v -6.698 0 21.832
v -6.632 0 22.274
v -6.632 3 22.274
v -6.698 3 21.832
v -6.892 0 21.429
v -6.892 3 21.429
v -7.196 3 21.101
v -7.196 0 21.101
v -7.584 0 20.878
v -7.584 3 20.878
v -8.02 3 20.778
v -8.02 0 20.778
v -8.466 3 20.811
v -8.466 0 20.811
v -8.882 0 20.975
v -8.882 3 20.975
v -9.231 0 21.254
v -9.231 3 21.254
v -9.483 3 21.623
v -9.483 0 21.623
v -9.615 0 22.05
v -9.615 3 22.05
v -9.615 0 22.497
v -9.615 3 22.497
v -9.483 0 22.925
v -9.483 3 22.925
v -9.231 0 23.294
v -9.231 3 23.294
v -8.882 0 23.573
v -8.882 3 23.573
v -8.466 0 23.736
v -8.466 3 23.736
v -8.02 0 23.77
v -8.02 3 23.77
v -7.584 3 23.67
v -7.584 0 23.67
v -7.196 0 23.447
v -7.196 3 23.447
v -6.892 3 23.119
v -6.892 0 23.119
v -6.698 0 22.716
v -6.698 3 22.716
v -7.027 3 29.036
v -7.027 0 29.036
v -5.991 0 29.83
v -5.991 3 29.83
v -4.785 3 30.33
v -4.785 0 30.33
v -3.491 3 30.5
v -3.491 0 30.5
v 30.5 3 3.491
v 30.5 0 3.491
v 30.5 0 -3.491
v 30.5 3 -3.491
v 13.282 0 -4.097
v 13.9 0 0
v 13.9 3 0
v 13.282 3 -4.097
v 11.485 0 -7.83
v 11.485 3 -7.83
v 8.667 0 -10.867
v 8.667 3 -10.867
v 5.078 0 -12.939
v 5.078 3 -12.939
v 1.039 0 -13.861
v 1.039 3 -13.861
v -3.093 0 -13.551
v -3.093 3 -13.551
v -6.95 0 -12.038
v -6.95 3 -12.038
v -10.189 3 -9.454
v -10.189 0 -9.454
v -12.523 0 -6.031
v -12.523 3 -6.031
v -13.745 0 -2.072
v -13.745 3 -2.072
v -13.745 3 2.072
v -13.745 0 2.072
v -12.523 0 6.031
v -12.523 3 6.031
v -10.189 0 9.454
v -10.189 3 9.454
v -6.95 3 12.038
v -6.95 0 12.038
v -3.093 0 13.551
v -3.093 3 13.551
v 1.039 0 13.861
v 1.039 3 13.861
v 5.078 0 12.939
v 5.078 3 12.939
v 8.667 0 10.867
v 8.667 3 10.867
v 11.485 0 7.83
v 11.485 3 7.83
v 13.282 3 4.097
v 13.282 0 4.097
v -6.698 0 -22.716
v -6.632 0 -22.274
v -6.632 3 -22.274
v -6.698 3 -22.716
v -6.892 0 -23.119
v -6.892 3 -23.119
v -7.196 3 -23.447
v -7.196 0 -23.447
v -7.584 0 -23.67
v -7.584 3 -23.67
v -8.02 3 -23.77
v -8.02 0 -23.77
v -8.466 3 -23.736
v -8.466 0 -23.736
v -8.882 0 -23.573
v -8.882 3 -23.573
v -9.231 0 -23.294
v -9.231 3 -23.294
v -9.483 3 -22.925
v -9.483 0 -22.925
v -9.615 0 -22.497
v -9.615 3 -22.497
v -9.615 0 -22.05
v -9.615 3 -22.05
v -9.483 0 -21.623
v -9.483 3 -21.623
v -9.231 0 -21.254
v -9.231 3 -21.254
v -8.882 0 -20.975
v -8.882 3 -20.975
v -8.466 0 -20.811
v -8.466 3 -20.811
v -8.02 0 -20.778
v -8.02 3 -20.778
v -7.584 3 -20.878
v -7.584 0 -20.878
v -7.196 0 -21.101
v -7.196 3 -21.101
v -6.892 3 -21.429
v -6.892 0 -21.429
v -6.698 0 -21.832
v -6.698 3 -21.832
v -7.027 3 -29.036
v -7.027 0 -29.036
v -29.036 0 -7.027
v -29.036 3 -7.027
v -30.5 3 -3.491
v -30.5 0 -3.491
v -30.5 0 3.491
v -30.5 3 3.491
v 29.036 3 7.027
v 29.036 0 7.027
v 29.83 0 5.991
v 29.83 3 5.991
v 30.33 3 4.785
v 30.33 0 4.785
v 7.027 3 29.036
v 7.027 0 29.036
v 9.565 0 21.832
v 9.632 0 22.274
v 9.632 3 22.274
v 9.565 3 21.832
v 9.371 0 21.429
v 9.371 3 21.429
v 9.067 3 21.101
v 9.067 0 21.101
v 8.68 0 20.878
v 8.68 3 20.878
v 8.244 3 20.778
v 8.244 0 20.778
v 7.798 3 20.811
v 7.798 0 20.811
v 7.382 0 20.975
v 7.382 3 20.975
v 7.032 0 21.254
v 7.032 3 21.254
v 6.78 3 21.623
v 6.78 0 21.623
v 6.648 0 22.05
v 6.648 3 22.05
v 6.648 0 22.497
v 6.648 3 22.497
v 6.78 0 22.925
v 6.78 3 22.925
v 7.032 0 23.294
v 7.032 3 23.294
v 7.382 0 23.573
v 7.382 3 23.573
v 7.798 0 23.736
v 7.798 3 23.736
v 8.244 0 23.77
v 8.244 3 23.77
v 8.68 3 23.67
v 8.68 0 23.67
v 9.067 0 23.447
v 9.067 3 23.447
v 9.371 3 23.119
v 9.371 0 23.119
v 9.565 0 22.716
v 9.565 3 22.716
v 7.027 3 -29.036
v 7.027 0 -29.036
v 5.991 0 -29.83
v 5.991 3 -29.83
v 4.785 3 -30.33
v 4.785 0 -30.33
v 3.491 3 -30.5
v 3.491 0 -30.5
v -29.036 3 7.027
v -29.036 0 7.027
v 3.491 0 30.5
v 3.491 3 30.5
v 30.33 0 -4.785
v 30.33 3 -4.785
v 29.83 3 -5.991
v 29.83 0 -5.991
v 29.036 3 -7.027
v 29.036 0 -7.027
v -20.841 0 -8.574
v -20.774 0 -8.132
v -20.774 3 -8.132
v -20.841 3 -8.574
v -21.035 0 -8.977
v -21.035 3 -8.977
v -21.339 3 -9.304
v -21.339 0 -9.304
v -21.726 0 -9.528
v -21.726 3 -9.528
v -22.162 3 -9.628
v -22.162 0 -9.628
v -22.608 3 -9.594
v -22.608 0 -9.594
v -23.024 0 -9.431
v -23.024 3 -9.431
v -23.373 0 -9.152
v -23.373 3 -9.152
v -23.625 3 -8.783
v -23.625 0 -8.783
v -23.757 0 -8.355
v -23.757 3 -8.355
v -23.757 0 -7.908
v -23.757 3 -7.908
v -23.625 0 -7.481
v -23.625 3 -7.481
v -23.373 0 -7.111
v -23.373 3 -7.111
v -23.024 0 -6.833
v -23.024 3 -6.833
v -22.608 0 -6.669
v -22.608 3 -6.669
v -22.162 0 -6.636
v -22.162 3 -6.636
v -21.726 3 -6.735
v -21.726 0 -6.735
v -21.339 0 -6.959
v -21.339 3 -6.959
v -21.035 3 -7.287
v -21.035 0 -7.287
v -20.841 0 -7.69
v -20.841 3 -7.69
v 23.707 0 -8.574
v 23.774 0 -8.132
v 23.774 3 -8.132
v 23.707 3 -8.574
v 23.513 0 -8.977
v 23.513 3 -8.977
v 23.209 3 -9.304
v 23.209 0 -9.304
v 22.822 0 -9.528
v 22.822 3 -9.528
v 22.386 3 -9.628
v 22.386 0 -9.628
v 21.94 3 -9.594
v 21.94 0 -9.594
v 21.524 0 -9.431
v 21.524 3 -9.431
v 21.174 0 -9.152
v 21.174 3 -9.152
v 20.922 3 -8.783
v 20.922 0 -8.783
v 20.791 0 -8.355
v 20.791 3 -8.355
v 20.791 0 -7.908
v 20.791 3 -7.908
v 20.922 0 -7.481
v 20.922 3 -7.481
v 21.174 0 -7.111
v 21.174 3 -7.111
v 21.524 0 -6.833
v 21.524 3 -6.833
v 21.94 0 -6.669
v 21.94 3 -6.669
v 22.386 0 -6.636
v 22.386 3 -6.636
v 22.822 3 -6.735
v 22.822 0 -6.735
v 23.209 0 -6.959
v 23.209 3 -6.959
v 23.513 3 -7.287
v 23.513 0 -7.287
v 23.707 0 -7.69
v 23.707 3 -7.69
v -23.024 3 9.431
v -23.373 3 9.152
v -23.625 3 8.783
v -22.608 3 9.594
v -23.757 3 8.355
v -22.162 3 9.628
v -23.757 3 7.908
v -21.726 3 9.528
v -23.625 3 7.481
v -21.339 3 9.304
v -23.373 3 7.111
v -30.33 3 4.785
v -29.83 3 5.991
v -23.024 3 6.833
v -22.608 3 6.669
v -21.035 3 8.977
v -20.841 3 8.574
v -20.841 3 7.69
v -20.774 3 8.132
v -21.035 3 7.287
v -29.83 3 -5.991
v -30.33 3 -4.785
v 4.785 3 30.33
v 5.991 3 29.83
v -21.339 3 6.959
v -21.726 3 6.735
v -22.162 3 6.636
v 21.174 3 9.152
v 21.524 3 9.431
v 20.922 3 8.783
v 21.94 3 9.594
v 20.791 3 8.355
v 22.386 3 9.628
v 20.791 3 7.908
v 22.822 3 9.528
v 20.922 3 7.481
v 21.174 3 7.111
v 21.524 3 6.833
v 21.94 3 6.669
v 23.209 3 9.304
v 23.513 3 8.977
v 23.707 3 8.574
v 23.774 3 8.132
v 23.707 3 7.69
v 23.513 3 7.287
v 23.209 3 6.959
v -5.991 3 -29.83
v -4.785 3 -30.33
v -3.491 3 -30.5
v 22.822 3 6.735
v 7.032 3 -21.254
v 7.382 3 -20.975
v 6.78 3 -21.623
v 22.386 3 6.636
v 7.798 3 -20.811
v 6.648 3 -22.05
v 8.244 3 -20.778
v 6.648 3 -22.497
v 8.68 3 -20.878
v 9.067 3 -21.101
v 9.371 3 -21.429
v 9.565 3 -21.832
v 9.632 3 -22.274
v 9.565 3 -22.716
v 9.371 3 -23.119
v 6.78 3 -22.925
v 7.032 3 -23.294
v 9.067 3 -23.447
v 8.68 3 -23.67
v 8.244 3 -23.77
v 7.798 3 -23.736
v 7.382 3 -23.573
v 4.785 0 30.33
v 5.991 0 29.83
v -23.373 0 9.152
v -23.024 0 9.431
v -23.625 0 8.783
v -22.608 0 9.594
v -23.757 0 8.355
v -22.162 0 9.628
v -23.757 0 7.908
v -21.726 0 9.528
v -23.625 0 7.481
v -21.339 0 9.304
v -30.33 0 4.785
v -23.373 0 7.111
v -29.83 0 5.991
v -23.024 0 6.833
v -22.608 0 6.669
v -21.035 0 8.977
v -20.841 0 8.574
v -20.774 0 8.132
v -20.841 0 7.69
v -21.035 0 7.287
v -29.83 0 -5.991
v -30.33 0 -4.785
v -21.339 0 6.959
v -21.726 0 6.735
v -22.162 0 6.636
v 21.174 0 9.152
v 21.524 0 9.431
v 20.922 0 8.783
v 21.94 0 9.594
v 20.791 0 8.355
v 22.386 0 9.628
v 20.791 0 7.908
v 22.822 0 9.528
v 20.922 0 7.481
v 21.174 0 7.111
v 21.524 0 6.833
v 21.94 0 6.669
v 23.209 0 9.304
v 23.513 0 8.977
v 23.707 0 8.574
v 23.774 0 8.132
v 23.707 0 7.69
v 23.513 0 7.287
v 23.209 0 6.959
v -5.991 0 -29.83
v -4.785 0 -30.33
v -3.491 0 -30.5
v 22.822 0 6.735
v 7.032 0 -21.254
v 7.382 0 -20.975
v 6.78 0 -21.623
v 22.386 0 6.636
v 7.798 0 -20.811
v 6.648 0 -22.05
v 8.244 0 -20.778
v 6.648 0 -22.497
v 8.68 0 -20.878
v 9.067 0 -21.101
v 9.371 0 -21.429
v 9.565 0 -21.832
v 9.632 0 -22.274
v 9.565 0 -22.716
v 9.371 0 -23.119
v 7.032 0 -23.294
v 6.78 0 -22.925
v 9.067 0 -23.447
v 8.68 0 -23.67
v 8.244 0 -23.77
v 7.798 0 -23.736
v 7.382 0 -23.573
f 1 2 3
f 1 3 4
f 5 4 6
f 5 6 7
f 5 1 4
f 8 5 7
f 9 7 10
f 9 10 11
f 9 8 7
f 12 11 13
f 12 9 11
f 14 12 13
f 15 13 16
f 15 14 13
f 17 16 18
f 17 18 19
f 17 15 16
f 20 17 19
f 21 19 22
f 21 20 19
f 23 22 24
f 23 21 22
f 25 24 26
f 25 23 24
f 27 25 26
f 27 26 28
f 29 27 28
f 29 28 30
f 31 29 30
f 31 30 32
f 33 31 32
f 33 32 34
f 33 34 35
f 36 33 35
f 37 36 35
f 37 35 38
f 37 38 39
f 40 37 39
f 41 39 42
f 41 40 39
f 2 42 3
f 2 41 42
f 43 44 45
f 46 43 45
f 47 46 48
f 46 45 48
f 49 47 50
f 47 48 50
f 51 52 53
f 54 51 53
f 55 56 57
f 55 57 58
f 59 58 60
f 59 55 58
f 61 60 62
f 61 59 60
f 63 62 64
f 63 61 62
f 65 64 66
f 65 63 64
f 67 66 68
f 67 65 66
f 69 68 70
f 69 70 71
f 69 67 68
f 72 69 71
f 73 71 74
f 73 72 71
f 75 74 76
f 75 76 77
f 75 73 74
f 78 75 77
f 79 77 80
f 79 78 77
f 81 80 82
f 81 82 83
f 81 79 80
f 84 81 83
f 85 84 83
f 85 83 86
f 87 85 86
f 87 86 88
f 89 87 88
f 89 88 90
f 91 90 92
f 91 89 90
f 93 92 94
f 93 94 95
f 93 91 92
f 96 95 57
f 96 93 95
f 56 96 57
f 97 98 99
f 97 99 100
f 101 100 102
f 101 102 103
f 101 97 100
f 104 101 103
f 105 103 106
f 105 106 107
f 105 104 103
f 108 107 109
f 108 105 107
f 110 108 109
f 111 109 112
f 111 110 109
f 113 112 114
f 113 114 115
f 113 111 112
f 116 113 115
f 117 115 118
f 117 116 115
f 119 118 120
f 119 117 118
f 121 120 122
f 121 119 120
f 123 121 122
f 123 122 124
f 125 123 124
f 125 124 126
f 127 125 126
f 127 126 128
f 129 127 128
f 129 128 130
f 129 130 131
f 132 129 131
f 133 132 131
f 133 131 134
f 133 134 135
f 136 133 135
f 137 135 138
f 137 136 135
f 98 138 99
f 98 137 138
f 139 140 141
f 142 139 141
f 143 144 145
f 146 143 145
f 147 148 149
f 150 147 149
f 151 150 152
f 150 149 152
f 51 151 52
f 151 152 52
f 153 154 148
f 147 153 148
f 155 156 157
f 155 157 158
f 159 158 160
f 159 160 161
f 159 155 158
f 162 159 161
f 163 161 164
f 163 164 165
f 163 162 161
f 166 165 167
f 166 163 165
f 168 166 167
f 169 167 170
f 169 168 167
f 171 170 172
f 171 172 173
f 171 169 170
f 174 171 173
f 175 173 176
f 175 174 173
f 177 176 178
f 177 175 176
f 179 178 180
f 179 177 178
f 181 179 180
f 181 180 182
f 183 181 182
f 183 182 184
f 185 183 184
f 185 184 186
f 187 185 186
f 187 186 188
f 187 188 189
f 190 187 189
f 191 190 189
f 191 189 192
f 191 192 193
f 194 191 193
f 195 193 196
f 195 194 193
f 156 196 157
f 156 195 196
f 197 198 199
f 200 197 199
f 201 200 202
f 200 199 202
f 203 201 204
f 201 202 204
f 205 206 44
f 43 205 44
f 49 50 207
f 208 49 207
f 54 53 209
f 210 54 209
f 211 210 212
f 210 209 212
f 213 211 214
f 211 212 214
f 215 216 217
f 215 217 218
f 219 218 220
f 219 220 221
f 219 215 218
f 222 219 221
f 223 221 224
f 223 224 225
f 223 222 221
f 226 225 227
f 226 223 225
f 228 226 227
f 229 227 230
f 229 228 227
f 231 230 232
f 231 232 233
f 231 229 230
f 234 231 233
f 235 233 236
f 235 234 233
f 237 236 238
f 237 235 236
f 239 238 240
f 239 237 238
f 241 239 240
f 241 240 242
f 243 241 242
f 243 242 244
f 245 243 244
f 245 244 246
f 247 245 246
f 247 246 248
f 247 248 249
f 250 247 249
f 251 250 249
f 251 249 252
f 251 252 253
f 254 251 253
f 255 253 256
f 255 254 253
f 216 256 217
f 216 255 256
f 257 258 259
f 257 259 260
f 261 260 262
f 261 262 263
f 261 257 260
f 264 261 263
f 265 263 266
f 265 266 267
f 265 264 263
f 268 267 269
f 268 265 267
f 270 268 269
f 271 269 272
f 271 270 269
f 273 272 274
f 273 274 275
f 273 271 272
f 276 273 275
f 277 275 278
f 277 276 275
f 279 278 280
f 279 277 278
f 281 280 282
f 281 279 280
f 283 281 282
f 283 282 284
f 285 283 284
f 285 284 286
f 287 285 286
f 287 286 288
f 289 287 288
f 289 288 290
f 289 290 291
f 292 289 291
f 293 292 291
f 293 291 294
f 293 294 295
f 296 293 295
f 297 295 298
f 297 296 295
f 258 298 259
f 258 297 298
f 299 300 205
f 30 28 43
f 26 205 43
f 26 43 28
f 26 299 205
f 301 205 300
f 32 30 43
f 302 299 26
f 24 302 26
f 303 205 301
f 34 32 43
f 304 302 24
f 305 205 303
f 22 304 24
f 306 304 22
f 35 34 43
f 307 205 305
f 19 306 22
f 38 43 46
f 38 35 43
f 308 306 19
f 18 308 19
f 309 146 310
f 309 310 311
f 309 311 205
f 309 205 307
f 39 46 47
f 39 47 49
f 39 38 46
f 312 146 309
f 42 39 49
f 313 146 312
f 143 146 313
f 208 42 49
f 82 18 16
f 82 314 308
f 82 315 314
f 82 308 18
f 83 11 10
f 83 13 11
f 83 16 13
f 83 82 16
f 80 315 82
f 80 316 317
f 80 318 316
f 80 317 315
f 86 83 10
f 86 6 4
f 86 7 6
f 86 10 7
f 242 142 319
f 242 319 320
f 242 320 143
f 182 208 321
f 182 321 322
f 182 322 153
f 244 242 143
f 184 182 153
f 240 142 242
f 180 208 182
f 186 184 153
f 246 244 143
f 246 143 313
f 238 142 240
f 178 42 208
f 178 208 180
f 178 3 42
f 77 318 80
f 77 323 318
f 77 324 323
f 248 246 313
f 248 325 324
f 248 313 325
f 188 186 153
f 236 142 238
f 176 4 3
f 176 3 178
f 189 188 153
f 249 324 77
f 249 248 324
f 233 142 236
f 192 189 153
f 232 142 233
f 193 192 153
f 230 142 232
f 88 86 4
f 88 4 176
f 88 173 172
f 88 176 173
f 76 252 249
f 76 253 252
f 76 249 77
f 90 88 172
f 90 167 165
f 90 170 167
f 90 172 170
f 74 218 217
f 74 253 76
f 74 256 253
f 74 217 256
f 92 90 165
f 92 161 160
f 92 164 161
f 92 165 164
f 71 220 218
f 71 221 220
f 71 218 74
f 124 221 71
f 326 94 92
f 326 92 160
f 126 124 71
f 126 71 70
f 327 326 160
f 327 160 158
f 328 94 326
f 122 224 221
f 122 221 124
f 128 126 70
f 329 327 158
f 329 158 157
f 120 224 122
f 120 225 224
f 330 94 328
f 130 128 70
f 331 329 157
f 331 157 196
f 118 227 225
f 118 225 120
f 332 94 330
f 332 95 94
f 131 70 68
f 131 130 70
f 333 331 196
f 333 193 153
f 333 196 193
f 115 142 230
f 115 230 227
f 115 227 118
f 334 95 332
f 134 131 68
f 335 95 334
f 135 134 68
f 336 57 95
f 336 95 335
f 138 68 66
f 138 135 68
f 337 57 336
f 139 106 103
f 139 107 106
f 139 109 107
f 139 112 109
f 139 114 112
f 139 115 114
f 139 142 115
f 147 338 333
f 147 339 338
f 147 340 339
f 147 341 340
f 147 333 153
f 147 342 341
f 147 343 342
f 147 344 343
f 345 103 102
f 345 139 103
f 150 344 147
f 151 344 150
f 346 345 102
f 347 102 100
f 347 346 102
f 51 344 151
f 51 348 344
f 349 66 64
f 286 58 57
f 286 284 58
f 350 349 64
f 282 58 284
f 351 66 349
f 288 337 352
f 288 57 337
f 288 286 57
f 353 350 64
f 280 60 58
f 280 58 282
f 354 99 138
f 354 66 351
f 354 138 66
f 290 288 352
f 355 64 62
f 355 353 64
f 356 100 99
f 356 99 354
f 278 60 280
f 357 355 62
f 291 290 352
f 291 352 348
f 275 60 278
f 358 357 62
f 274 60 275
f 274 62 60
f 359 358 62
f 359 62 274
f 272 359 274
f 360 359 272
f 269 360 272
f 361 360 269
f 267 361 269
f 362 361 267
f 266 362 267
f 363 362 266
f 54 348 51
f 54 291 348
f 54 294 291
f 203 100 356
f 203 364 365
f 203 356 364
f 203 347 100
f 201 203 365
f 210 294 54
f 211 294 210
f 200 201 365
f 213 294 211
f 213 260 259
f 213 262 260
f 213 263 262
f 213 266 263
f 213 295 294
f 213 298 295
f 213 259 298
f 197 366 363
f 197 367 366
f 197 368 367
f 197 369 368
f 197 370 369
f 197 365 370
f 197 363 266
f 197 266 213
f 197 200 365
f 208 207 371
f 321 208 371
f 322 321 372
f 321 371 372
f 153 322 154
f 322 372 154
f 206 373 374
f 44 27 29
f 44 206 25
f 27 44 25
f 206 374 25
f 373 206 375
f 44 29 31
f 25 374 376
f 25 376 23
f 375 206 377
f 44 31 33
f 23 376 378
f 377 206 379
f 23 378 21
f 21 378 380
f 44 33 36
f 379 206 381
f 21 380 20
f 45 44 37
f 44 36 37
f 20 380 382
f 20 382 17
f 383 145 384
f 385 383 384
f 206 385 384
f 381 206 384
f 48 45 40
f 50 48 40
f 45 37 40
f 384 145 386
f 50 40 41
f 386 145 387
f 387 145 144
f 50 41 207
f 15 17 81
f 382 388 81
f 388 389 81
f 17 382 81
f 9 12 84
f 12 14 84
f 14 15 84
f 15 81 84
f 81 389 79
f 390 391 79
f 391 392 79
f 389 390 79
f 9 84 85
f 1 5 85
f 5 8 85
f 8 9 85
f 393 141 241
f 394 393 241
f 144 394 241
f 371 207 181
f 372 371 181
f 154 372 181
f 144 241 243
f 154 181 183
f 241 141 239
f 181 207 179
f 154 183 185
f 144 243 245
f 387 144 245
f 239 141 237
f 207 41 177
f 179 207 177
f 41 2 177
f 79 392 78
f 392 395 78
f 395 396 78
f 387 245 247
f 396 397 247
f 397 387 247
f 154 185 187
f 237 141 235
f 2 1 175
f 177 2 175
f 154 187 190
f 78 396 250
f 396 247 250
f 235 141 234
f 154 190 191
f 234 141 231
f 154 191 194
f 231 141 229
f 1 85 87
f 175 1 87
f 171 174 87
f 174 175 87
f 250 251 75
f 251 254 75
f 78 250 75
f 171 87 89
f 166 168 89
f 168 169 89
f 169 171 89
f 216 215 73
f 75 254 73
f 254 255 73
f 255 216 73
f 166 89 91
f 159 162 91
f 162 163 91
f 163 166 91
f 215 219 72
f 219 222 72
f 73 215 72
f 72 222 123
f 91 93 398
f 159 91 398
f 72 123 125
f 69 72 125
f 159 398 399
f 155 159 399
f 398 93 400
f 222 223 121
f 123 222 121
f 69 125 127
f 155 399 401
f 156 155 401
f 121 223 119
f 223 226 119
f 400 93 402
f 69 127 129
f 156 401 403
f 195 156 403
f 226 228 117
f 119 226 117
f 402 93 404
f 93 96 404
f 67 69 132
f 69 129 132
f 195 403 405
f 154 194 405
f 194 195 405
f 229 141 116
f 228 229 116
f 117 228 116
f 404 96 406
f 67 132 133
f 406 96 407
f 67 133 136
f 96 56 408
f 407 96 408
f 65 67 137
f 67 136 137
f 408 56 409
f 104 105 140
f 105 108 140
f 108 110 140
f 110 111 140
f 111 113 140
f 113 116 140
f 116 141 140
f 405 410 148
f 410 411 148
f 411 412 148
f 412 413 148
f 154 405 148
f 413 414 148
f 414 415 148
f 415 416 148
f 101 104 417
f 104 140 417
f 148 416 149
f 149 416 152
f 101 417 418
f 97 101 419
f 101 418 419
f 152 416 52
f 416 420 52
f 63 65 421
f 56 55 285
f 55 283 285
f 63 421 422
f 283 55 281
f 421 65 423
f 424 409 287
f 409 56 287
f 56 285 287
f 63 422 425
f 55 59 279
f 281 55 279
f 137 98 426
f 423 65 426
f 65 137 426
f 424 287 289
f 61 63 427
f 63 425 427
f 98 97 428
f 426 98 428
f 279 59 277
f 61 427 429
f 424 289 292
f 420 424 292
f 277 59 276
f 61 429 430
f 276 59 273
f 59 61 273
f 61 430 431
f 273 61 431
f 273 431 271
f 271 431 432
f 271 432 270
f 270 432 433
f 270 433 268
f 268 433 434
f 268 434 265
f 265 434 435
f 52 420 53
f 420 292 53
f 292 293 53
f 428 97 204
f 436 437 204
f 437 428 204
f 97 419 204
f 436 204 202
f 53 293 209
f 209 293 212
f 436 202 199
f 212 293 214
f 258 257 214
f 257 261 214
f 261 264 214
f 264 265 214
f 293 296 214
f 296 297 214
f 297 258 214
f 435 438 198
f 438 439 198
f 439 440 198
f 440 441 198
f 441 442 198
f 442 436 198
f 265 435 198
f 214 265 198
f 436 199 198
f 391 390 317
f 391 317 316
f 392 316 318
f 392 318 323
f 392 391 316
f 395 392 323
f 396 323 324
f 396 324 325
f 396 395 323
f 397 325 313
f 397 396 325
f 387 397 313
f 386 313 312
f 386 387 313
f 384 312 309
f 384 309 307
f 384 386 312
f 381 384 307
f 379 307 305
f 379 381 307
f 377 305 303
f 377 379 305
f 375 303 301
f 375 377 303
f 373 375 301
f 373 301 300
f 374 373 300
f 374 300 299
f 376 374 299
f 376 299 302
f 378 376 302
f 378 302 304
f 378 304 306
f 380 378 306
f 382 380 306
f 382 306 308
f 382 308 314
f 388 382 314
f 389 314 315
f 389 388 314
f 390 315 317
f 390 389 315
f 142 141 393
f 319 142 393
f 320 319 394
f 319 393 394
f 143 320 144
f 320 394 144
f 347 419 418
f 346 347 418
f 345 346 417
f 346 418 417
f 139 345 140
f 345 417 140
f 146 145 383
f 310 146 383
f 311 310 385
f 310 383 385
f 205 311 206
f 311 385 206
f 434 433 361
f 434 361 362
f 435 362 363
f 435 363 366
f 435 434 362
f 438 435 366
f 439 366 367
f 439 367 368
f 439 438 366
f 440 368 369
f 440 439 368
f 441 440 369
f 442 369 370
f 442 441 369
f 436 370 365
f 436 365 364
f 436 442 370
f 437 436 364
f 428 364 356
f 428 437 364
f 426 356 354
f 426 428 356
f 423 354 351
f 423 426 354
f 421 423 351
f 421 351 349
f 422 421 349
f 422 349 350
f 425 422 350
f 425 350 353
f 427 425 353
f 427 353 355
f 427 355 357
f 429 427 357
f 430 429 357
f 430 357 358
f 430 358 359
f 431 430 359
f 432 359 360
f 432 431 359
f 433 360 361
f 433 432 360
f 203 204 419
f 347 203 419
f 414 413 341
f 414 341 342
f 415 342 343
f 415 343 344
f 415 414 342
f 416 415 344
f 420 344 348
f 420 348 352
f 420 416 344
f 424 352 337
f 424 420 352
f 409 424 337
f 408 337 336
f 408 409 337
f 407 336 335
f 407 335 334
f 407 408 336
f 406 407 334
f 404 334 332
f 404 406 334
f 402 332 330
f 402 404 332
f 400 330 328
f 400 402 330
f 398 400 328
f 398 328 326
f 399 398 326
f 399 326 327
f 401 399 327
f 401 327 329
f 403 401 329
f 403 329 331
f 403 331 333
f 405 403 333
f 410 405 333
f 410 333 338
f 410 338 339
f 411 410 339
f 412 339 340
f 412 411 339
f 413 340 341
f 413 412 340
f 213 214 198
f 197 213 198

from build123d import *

# Parameters (mm, degrees)
SKETCH1_R           = 1.5
SKETCH1_R_2         = 13.9
BOSS_EXTRUDE1_DEPTH = 3


with BuildPart() as part:
    # Sketch1 → Boss-Extrude1 (new body)
    with BuildSketch(Plane(origin=(0, 0, 0), x_dir=(1, 0, 0), z_dir=(0, 1, 0))):
        with BuildLine():
            Line((3.491378029, 30.5), (-3.491378029, 30.5))
            ThreePointArc((-3.491378029, 30.5), (-5.40479519, 30.119397663), (-7.026911935, 29.035533906))
            Line((-7.026911935, 29.035533906), (-29.035533906, 7.026911935))
            ThreePointArc((-29.035533906, 7.026911935), (-30.119397663, 5.40479519), (-30.5, 3.491378029))
            Line((-30.5, 3.491378029), (-30.5, -3.491378029))
            ThreePointArc((-30.5, -3.491378029), (-30.119397663, -5.40479519), (-29.035533906, -7.026911935))
            Line((-29.035533906, -7.026911935), (-7.026911935, -29.035533906))
            ThreePointArc((-7.026911935, -29.035533906), (-5.40479519, -30.119397663), (-3.491378029, -30.5))
            Line((-3.491378029, -30.5), (3.491378029, -30.5))
            ThreePointArc((3.491378029, -30.5), (5.40479519, -30.119397663), (7.026911935, -29.035533906))
            Line((7.026911935, -29.035533906), (29.035533906, -7.026911935))
            ThreePointArc((29.035533906, -7.026911935), (30.119397663, -5.40479519), (30.5, -3.491378029))
            Line((30.5, -3.491378029), (30.5, 3.491378029))
            ThreePointArc((30.5, 3.491378029), (30.119397663, 5.40479519), (29.035533906, 7.026911935))
            Line((29.035533906, 7.026911935), (7.026911935, 29.035533906))
            ThreePointArc((7.026911935, 29.035533906), (5.40479519, 30.119397663), (3.491378029, 30.5))
        make_face()
        with Locations((-8.131727984, -22.273863607)):
            Circle(SKETCH1_R, mode=Mode.SUBTRACT)
        with Locations((8.131727984, -22.273863607)):
            Circle(SKETCH1_R, mode=Mode.SUBTRACT)
        with Locations((22.273863607, -8.131727984)):
            Circle(SKETCH1_R, mode=Mode.SUBTRACT)
        with Locations((22.273863607, 8.131727984)):
            Circle(SKETCH1_R, mode=Mode.SUBTRACT)
        with Locations((8.131727984, 22.273863607)):
            Circle(SKETCH1_R, mode=Mode.SUBTRACT)
        with Locations((-8.131727984, 22.273863607)):
            Circle(SKETCH1_R, mode=Mode.SUBTRACT)
        with Locations((-22.273863607, -8.131727984)):
            Circle(SKETCH1_R, mode=Mode.SUBTRACT)
        with Locations((-22.273863607, 8.131727984)):
            Circle(SKETCH1_R, mode=Mode.SUBTRACT)
        Circle(SKETCH1_R_2, mode=Mode.SUBTRACT)
    extrude(amount=BOSS_EXTRUDE1_DEPTH)


solid = part.part
